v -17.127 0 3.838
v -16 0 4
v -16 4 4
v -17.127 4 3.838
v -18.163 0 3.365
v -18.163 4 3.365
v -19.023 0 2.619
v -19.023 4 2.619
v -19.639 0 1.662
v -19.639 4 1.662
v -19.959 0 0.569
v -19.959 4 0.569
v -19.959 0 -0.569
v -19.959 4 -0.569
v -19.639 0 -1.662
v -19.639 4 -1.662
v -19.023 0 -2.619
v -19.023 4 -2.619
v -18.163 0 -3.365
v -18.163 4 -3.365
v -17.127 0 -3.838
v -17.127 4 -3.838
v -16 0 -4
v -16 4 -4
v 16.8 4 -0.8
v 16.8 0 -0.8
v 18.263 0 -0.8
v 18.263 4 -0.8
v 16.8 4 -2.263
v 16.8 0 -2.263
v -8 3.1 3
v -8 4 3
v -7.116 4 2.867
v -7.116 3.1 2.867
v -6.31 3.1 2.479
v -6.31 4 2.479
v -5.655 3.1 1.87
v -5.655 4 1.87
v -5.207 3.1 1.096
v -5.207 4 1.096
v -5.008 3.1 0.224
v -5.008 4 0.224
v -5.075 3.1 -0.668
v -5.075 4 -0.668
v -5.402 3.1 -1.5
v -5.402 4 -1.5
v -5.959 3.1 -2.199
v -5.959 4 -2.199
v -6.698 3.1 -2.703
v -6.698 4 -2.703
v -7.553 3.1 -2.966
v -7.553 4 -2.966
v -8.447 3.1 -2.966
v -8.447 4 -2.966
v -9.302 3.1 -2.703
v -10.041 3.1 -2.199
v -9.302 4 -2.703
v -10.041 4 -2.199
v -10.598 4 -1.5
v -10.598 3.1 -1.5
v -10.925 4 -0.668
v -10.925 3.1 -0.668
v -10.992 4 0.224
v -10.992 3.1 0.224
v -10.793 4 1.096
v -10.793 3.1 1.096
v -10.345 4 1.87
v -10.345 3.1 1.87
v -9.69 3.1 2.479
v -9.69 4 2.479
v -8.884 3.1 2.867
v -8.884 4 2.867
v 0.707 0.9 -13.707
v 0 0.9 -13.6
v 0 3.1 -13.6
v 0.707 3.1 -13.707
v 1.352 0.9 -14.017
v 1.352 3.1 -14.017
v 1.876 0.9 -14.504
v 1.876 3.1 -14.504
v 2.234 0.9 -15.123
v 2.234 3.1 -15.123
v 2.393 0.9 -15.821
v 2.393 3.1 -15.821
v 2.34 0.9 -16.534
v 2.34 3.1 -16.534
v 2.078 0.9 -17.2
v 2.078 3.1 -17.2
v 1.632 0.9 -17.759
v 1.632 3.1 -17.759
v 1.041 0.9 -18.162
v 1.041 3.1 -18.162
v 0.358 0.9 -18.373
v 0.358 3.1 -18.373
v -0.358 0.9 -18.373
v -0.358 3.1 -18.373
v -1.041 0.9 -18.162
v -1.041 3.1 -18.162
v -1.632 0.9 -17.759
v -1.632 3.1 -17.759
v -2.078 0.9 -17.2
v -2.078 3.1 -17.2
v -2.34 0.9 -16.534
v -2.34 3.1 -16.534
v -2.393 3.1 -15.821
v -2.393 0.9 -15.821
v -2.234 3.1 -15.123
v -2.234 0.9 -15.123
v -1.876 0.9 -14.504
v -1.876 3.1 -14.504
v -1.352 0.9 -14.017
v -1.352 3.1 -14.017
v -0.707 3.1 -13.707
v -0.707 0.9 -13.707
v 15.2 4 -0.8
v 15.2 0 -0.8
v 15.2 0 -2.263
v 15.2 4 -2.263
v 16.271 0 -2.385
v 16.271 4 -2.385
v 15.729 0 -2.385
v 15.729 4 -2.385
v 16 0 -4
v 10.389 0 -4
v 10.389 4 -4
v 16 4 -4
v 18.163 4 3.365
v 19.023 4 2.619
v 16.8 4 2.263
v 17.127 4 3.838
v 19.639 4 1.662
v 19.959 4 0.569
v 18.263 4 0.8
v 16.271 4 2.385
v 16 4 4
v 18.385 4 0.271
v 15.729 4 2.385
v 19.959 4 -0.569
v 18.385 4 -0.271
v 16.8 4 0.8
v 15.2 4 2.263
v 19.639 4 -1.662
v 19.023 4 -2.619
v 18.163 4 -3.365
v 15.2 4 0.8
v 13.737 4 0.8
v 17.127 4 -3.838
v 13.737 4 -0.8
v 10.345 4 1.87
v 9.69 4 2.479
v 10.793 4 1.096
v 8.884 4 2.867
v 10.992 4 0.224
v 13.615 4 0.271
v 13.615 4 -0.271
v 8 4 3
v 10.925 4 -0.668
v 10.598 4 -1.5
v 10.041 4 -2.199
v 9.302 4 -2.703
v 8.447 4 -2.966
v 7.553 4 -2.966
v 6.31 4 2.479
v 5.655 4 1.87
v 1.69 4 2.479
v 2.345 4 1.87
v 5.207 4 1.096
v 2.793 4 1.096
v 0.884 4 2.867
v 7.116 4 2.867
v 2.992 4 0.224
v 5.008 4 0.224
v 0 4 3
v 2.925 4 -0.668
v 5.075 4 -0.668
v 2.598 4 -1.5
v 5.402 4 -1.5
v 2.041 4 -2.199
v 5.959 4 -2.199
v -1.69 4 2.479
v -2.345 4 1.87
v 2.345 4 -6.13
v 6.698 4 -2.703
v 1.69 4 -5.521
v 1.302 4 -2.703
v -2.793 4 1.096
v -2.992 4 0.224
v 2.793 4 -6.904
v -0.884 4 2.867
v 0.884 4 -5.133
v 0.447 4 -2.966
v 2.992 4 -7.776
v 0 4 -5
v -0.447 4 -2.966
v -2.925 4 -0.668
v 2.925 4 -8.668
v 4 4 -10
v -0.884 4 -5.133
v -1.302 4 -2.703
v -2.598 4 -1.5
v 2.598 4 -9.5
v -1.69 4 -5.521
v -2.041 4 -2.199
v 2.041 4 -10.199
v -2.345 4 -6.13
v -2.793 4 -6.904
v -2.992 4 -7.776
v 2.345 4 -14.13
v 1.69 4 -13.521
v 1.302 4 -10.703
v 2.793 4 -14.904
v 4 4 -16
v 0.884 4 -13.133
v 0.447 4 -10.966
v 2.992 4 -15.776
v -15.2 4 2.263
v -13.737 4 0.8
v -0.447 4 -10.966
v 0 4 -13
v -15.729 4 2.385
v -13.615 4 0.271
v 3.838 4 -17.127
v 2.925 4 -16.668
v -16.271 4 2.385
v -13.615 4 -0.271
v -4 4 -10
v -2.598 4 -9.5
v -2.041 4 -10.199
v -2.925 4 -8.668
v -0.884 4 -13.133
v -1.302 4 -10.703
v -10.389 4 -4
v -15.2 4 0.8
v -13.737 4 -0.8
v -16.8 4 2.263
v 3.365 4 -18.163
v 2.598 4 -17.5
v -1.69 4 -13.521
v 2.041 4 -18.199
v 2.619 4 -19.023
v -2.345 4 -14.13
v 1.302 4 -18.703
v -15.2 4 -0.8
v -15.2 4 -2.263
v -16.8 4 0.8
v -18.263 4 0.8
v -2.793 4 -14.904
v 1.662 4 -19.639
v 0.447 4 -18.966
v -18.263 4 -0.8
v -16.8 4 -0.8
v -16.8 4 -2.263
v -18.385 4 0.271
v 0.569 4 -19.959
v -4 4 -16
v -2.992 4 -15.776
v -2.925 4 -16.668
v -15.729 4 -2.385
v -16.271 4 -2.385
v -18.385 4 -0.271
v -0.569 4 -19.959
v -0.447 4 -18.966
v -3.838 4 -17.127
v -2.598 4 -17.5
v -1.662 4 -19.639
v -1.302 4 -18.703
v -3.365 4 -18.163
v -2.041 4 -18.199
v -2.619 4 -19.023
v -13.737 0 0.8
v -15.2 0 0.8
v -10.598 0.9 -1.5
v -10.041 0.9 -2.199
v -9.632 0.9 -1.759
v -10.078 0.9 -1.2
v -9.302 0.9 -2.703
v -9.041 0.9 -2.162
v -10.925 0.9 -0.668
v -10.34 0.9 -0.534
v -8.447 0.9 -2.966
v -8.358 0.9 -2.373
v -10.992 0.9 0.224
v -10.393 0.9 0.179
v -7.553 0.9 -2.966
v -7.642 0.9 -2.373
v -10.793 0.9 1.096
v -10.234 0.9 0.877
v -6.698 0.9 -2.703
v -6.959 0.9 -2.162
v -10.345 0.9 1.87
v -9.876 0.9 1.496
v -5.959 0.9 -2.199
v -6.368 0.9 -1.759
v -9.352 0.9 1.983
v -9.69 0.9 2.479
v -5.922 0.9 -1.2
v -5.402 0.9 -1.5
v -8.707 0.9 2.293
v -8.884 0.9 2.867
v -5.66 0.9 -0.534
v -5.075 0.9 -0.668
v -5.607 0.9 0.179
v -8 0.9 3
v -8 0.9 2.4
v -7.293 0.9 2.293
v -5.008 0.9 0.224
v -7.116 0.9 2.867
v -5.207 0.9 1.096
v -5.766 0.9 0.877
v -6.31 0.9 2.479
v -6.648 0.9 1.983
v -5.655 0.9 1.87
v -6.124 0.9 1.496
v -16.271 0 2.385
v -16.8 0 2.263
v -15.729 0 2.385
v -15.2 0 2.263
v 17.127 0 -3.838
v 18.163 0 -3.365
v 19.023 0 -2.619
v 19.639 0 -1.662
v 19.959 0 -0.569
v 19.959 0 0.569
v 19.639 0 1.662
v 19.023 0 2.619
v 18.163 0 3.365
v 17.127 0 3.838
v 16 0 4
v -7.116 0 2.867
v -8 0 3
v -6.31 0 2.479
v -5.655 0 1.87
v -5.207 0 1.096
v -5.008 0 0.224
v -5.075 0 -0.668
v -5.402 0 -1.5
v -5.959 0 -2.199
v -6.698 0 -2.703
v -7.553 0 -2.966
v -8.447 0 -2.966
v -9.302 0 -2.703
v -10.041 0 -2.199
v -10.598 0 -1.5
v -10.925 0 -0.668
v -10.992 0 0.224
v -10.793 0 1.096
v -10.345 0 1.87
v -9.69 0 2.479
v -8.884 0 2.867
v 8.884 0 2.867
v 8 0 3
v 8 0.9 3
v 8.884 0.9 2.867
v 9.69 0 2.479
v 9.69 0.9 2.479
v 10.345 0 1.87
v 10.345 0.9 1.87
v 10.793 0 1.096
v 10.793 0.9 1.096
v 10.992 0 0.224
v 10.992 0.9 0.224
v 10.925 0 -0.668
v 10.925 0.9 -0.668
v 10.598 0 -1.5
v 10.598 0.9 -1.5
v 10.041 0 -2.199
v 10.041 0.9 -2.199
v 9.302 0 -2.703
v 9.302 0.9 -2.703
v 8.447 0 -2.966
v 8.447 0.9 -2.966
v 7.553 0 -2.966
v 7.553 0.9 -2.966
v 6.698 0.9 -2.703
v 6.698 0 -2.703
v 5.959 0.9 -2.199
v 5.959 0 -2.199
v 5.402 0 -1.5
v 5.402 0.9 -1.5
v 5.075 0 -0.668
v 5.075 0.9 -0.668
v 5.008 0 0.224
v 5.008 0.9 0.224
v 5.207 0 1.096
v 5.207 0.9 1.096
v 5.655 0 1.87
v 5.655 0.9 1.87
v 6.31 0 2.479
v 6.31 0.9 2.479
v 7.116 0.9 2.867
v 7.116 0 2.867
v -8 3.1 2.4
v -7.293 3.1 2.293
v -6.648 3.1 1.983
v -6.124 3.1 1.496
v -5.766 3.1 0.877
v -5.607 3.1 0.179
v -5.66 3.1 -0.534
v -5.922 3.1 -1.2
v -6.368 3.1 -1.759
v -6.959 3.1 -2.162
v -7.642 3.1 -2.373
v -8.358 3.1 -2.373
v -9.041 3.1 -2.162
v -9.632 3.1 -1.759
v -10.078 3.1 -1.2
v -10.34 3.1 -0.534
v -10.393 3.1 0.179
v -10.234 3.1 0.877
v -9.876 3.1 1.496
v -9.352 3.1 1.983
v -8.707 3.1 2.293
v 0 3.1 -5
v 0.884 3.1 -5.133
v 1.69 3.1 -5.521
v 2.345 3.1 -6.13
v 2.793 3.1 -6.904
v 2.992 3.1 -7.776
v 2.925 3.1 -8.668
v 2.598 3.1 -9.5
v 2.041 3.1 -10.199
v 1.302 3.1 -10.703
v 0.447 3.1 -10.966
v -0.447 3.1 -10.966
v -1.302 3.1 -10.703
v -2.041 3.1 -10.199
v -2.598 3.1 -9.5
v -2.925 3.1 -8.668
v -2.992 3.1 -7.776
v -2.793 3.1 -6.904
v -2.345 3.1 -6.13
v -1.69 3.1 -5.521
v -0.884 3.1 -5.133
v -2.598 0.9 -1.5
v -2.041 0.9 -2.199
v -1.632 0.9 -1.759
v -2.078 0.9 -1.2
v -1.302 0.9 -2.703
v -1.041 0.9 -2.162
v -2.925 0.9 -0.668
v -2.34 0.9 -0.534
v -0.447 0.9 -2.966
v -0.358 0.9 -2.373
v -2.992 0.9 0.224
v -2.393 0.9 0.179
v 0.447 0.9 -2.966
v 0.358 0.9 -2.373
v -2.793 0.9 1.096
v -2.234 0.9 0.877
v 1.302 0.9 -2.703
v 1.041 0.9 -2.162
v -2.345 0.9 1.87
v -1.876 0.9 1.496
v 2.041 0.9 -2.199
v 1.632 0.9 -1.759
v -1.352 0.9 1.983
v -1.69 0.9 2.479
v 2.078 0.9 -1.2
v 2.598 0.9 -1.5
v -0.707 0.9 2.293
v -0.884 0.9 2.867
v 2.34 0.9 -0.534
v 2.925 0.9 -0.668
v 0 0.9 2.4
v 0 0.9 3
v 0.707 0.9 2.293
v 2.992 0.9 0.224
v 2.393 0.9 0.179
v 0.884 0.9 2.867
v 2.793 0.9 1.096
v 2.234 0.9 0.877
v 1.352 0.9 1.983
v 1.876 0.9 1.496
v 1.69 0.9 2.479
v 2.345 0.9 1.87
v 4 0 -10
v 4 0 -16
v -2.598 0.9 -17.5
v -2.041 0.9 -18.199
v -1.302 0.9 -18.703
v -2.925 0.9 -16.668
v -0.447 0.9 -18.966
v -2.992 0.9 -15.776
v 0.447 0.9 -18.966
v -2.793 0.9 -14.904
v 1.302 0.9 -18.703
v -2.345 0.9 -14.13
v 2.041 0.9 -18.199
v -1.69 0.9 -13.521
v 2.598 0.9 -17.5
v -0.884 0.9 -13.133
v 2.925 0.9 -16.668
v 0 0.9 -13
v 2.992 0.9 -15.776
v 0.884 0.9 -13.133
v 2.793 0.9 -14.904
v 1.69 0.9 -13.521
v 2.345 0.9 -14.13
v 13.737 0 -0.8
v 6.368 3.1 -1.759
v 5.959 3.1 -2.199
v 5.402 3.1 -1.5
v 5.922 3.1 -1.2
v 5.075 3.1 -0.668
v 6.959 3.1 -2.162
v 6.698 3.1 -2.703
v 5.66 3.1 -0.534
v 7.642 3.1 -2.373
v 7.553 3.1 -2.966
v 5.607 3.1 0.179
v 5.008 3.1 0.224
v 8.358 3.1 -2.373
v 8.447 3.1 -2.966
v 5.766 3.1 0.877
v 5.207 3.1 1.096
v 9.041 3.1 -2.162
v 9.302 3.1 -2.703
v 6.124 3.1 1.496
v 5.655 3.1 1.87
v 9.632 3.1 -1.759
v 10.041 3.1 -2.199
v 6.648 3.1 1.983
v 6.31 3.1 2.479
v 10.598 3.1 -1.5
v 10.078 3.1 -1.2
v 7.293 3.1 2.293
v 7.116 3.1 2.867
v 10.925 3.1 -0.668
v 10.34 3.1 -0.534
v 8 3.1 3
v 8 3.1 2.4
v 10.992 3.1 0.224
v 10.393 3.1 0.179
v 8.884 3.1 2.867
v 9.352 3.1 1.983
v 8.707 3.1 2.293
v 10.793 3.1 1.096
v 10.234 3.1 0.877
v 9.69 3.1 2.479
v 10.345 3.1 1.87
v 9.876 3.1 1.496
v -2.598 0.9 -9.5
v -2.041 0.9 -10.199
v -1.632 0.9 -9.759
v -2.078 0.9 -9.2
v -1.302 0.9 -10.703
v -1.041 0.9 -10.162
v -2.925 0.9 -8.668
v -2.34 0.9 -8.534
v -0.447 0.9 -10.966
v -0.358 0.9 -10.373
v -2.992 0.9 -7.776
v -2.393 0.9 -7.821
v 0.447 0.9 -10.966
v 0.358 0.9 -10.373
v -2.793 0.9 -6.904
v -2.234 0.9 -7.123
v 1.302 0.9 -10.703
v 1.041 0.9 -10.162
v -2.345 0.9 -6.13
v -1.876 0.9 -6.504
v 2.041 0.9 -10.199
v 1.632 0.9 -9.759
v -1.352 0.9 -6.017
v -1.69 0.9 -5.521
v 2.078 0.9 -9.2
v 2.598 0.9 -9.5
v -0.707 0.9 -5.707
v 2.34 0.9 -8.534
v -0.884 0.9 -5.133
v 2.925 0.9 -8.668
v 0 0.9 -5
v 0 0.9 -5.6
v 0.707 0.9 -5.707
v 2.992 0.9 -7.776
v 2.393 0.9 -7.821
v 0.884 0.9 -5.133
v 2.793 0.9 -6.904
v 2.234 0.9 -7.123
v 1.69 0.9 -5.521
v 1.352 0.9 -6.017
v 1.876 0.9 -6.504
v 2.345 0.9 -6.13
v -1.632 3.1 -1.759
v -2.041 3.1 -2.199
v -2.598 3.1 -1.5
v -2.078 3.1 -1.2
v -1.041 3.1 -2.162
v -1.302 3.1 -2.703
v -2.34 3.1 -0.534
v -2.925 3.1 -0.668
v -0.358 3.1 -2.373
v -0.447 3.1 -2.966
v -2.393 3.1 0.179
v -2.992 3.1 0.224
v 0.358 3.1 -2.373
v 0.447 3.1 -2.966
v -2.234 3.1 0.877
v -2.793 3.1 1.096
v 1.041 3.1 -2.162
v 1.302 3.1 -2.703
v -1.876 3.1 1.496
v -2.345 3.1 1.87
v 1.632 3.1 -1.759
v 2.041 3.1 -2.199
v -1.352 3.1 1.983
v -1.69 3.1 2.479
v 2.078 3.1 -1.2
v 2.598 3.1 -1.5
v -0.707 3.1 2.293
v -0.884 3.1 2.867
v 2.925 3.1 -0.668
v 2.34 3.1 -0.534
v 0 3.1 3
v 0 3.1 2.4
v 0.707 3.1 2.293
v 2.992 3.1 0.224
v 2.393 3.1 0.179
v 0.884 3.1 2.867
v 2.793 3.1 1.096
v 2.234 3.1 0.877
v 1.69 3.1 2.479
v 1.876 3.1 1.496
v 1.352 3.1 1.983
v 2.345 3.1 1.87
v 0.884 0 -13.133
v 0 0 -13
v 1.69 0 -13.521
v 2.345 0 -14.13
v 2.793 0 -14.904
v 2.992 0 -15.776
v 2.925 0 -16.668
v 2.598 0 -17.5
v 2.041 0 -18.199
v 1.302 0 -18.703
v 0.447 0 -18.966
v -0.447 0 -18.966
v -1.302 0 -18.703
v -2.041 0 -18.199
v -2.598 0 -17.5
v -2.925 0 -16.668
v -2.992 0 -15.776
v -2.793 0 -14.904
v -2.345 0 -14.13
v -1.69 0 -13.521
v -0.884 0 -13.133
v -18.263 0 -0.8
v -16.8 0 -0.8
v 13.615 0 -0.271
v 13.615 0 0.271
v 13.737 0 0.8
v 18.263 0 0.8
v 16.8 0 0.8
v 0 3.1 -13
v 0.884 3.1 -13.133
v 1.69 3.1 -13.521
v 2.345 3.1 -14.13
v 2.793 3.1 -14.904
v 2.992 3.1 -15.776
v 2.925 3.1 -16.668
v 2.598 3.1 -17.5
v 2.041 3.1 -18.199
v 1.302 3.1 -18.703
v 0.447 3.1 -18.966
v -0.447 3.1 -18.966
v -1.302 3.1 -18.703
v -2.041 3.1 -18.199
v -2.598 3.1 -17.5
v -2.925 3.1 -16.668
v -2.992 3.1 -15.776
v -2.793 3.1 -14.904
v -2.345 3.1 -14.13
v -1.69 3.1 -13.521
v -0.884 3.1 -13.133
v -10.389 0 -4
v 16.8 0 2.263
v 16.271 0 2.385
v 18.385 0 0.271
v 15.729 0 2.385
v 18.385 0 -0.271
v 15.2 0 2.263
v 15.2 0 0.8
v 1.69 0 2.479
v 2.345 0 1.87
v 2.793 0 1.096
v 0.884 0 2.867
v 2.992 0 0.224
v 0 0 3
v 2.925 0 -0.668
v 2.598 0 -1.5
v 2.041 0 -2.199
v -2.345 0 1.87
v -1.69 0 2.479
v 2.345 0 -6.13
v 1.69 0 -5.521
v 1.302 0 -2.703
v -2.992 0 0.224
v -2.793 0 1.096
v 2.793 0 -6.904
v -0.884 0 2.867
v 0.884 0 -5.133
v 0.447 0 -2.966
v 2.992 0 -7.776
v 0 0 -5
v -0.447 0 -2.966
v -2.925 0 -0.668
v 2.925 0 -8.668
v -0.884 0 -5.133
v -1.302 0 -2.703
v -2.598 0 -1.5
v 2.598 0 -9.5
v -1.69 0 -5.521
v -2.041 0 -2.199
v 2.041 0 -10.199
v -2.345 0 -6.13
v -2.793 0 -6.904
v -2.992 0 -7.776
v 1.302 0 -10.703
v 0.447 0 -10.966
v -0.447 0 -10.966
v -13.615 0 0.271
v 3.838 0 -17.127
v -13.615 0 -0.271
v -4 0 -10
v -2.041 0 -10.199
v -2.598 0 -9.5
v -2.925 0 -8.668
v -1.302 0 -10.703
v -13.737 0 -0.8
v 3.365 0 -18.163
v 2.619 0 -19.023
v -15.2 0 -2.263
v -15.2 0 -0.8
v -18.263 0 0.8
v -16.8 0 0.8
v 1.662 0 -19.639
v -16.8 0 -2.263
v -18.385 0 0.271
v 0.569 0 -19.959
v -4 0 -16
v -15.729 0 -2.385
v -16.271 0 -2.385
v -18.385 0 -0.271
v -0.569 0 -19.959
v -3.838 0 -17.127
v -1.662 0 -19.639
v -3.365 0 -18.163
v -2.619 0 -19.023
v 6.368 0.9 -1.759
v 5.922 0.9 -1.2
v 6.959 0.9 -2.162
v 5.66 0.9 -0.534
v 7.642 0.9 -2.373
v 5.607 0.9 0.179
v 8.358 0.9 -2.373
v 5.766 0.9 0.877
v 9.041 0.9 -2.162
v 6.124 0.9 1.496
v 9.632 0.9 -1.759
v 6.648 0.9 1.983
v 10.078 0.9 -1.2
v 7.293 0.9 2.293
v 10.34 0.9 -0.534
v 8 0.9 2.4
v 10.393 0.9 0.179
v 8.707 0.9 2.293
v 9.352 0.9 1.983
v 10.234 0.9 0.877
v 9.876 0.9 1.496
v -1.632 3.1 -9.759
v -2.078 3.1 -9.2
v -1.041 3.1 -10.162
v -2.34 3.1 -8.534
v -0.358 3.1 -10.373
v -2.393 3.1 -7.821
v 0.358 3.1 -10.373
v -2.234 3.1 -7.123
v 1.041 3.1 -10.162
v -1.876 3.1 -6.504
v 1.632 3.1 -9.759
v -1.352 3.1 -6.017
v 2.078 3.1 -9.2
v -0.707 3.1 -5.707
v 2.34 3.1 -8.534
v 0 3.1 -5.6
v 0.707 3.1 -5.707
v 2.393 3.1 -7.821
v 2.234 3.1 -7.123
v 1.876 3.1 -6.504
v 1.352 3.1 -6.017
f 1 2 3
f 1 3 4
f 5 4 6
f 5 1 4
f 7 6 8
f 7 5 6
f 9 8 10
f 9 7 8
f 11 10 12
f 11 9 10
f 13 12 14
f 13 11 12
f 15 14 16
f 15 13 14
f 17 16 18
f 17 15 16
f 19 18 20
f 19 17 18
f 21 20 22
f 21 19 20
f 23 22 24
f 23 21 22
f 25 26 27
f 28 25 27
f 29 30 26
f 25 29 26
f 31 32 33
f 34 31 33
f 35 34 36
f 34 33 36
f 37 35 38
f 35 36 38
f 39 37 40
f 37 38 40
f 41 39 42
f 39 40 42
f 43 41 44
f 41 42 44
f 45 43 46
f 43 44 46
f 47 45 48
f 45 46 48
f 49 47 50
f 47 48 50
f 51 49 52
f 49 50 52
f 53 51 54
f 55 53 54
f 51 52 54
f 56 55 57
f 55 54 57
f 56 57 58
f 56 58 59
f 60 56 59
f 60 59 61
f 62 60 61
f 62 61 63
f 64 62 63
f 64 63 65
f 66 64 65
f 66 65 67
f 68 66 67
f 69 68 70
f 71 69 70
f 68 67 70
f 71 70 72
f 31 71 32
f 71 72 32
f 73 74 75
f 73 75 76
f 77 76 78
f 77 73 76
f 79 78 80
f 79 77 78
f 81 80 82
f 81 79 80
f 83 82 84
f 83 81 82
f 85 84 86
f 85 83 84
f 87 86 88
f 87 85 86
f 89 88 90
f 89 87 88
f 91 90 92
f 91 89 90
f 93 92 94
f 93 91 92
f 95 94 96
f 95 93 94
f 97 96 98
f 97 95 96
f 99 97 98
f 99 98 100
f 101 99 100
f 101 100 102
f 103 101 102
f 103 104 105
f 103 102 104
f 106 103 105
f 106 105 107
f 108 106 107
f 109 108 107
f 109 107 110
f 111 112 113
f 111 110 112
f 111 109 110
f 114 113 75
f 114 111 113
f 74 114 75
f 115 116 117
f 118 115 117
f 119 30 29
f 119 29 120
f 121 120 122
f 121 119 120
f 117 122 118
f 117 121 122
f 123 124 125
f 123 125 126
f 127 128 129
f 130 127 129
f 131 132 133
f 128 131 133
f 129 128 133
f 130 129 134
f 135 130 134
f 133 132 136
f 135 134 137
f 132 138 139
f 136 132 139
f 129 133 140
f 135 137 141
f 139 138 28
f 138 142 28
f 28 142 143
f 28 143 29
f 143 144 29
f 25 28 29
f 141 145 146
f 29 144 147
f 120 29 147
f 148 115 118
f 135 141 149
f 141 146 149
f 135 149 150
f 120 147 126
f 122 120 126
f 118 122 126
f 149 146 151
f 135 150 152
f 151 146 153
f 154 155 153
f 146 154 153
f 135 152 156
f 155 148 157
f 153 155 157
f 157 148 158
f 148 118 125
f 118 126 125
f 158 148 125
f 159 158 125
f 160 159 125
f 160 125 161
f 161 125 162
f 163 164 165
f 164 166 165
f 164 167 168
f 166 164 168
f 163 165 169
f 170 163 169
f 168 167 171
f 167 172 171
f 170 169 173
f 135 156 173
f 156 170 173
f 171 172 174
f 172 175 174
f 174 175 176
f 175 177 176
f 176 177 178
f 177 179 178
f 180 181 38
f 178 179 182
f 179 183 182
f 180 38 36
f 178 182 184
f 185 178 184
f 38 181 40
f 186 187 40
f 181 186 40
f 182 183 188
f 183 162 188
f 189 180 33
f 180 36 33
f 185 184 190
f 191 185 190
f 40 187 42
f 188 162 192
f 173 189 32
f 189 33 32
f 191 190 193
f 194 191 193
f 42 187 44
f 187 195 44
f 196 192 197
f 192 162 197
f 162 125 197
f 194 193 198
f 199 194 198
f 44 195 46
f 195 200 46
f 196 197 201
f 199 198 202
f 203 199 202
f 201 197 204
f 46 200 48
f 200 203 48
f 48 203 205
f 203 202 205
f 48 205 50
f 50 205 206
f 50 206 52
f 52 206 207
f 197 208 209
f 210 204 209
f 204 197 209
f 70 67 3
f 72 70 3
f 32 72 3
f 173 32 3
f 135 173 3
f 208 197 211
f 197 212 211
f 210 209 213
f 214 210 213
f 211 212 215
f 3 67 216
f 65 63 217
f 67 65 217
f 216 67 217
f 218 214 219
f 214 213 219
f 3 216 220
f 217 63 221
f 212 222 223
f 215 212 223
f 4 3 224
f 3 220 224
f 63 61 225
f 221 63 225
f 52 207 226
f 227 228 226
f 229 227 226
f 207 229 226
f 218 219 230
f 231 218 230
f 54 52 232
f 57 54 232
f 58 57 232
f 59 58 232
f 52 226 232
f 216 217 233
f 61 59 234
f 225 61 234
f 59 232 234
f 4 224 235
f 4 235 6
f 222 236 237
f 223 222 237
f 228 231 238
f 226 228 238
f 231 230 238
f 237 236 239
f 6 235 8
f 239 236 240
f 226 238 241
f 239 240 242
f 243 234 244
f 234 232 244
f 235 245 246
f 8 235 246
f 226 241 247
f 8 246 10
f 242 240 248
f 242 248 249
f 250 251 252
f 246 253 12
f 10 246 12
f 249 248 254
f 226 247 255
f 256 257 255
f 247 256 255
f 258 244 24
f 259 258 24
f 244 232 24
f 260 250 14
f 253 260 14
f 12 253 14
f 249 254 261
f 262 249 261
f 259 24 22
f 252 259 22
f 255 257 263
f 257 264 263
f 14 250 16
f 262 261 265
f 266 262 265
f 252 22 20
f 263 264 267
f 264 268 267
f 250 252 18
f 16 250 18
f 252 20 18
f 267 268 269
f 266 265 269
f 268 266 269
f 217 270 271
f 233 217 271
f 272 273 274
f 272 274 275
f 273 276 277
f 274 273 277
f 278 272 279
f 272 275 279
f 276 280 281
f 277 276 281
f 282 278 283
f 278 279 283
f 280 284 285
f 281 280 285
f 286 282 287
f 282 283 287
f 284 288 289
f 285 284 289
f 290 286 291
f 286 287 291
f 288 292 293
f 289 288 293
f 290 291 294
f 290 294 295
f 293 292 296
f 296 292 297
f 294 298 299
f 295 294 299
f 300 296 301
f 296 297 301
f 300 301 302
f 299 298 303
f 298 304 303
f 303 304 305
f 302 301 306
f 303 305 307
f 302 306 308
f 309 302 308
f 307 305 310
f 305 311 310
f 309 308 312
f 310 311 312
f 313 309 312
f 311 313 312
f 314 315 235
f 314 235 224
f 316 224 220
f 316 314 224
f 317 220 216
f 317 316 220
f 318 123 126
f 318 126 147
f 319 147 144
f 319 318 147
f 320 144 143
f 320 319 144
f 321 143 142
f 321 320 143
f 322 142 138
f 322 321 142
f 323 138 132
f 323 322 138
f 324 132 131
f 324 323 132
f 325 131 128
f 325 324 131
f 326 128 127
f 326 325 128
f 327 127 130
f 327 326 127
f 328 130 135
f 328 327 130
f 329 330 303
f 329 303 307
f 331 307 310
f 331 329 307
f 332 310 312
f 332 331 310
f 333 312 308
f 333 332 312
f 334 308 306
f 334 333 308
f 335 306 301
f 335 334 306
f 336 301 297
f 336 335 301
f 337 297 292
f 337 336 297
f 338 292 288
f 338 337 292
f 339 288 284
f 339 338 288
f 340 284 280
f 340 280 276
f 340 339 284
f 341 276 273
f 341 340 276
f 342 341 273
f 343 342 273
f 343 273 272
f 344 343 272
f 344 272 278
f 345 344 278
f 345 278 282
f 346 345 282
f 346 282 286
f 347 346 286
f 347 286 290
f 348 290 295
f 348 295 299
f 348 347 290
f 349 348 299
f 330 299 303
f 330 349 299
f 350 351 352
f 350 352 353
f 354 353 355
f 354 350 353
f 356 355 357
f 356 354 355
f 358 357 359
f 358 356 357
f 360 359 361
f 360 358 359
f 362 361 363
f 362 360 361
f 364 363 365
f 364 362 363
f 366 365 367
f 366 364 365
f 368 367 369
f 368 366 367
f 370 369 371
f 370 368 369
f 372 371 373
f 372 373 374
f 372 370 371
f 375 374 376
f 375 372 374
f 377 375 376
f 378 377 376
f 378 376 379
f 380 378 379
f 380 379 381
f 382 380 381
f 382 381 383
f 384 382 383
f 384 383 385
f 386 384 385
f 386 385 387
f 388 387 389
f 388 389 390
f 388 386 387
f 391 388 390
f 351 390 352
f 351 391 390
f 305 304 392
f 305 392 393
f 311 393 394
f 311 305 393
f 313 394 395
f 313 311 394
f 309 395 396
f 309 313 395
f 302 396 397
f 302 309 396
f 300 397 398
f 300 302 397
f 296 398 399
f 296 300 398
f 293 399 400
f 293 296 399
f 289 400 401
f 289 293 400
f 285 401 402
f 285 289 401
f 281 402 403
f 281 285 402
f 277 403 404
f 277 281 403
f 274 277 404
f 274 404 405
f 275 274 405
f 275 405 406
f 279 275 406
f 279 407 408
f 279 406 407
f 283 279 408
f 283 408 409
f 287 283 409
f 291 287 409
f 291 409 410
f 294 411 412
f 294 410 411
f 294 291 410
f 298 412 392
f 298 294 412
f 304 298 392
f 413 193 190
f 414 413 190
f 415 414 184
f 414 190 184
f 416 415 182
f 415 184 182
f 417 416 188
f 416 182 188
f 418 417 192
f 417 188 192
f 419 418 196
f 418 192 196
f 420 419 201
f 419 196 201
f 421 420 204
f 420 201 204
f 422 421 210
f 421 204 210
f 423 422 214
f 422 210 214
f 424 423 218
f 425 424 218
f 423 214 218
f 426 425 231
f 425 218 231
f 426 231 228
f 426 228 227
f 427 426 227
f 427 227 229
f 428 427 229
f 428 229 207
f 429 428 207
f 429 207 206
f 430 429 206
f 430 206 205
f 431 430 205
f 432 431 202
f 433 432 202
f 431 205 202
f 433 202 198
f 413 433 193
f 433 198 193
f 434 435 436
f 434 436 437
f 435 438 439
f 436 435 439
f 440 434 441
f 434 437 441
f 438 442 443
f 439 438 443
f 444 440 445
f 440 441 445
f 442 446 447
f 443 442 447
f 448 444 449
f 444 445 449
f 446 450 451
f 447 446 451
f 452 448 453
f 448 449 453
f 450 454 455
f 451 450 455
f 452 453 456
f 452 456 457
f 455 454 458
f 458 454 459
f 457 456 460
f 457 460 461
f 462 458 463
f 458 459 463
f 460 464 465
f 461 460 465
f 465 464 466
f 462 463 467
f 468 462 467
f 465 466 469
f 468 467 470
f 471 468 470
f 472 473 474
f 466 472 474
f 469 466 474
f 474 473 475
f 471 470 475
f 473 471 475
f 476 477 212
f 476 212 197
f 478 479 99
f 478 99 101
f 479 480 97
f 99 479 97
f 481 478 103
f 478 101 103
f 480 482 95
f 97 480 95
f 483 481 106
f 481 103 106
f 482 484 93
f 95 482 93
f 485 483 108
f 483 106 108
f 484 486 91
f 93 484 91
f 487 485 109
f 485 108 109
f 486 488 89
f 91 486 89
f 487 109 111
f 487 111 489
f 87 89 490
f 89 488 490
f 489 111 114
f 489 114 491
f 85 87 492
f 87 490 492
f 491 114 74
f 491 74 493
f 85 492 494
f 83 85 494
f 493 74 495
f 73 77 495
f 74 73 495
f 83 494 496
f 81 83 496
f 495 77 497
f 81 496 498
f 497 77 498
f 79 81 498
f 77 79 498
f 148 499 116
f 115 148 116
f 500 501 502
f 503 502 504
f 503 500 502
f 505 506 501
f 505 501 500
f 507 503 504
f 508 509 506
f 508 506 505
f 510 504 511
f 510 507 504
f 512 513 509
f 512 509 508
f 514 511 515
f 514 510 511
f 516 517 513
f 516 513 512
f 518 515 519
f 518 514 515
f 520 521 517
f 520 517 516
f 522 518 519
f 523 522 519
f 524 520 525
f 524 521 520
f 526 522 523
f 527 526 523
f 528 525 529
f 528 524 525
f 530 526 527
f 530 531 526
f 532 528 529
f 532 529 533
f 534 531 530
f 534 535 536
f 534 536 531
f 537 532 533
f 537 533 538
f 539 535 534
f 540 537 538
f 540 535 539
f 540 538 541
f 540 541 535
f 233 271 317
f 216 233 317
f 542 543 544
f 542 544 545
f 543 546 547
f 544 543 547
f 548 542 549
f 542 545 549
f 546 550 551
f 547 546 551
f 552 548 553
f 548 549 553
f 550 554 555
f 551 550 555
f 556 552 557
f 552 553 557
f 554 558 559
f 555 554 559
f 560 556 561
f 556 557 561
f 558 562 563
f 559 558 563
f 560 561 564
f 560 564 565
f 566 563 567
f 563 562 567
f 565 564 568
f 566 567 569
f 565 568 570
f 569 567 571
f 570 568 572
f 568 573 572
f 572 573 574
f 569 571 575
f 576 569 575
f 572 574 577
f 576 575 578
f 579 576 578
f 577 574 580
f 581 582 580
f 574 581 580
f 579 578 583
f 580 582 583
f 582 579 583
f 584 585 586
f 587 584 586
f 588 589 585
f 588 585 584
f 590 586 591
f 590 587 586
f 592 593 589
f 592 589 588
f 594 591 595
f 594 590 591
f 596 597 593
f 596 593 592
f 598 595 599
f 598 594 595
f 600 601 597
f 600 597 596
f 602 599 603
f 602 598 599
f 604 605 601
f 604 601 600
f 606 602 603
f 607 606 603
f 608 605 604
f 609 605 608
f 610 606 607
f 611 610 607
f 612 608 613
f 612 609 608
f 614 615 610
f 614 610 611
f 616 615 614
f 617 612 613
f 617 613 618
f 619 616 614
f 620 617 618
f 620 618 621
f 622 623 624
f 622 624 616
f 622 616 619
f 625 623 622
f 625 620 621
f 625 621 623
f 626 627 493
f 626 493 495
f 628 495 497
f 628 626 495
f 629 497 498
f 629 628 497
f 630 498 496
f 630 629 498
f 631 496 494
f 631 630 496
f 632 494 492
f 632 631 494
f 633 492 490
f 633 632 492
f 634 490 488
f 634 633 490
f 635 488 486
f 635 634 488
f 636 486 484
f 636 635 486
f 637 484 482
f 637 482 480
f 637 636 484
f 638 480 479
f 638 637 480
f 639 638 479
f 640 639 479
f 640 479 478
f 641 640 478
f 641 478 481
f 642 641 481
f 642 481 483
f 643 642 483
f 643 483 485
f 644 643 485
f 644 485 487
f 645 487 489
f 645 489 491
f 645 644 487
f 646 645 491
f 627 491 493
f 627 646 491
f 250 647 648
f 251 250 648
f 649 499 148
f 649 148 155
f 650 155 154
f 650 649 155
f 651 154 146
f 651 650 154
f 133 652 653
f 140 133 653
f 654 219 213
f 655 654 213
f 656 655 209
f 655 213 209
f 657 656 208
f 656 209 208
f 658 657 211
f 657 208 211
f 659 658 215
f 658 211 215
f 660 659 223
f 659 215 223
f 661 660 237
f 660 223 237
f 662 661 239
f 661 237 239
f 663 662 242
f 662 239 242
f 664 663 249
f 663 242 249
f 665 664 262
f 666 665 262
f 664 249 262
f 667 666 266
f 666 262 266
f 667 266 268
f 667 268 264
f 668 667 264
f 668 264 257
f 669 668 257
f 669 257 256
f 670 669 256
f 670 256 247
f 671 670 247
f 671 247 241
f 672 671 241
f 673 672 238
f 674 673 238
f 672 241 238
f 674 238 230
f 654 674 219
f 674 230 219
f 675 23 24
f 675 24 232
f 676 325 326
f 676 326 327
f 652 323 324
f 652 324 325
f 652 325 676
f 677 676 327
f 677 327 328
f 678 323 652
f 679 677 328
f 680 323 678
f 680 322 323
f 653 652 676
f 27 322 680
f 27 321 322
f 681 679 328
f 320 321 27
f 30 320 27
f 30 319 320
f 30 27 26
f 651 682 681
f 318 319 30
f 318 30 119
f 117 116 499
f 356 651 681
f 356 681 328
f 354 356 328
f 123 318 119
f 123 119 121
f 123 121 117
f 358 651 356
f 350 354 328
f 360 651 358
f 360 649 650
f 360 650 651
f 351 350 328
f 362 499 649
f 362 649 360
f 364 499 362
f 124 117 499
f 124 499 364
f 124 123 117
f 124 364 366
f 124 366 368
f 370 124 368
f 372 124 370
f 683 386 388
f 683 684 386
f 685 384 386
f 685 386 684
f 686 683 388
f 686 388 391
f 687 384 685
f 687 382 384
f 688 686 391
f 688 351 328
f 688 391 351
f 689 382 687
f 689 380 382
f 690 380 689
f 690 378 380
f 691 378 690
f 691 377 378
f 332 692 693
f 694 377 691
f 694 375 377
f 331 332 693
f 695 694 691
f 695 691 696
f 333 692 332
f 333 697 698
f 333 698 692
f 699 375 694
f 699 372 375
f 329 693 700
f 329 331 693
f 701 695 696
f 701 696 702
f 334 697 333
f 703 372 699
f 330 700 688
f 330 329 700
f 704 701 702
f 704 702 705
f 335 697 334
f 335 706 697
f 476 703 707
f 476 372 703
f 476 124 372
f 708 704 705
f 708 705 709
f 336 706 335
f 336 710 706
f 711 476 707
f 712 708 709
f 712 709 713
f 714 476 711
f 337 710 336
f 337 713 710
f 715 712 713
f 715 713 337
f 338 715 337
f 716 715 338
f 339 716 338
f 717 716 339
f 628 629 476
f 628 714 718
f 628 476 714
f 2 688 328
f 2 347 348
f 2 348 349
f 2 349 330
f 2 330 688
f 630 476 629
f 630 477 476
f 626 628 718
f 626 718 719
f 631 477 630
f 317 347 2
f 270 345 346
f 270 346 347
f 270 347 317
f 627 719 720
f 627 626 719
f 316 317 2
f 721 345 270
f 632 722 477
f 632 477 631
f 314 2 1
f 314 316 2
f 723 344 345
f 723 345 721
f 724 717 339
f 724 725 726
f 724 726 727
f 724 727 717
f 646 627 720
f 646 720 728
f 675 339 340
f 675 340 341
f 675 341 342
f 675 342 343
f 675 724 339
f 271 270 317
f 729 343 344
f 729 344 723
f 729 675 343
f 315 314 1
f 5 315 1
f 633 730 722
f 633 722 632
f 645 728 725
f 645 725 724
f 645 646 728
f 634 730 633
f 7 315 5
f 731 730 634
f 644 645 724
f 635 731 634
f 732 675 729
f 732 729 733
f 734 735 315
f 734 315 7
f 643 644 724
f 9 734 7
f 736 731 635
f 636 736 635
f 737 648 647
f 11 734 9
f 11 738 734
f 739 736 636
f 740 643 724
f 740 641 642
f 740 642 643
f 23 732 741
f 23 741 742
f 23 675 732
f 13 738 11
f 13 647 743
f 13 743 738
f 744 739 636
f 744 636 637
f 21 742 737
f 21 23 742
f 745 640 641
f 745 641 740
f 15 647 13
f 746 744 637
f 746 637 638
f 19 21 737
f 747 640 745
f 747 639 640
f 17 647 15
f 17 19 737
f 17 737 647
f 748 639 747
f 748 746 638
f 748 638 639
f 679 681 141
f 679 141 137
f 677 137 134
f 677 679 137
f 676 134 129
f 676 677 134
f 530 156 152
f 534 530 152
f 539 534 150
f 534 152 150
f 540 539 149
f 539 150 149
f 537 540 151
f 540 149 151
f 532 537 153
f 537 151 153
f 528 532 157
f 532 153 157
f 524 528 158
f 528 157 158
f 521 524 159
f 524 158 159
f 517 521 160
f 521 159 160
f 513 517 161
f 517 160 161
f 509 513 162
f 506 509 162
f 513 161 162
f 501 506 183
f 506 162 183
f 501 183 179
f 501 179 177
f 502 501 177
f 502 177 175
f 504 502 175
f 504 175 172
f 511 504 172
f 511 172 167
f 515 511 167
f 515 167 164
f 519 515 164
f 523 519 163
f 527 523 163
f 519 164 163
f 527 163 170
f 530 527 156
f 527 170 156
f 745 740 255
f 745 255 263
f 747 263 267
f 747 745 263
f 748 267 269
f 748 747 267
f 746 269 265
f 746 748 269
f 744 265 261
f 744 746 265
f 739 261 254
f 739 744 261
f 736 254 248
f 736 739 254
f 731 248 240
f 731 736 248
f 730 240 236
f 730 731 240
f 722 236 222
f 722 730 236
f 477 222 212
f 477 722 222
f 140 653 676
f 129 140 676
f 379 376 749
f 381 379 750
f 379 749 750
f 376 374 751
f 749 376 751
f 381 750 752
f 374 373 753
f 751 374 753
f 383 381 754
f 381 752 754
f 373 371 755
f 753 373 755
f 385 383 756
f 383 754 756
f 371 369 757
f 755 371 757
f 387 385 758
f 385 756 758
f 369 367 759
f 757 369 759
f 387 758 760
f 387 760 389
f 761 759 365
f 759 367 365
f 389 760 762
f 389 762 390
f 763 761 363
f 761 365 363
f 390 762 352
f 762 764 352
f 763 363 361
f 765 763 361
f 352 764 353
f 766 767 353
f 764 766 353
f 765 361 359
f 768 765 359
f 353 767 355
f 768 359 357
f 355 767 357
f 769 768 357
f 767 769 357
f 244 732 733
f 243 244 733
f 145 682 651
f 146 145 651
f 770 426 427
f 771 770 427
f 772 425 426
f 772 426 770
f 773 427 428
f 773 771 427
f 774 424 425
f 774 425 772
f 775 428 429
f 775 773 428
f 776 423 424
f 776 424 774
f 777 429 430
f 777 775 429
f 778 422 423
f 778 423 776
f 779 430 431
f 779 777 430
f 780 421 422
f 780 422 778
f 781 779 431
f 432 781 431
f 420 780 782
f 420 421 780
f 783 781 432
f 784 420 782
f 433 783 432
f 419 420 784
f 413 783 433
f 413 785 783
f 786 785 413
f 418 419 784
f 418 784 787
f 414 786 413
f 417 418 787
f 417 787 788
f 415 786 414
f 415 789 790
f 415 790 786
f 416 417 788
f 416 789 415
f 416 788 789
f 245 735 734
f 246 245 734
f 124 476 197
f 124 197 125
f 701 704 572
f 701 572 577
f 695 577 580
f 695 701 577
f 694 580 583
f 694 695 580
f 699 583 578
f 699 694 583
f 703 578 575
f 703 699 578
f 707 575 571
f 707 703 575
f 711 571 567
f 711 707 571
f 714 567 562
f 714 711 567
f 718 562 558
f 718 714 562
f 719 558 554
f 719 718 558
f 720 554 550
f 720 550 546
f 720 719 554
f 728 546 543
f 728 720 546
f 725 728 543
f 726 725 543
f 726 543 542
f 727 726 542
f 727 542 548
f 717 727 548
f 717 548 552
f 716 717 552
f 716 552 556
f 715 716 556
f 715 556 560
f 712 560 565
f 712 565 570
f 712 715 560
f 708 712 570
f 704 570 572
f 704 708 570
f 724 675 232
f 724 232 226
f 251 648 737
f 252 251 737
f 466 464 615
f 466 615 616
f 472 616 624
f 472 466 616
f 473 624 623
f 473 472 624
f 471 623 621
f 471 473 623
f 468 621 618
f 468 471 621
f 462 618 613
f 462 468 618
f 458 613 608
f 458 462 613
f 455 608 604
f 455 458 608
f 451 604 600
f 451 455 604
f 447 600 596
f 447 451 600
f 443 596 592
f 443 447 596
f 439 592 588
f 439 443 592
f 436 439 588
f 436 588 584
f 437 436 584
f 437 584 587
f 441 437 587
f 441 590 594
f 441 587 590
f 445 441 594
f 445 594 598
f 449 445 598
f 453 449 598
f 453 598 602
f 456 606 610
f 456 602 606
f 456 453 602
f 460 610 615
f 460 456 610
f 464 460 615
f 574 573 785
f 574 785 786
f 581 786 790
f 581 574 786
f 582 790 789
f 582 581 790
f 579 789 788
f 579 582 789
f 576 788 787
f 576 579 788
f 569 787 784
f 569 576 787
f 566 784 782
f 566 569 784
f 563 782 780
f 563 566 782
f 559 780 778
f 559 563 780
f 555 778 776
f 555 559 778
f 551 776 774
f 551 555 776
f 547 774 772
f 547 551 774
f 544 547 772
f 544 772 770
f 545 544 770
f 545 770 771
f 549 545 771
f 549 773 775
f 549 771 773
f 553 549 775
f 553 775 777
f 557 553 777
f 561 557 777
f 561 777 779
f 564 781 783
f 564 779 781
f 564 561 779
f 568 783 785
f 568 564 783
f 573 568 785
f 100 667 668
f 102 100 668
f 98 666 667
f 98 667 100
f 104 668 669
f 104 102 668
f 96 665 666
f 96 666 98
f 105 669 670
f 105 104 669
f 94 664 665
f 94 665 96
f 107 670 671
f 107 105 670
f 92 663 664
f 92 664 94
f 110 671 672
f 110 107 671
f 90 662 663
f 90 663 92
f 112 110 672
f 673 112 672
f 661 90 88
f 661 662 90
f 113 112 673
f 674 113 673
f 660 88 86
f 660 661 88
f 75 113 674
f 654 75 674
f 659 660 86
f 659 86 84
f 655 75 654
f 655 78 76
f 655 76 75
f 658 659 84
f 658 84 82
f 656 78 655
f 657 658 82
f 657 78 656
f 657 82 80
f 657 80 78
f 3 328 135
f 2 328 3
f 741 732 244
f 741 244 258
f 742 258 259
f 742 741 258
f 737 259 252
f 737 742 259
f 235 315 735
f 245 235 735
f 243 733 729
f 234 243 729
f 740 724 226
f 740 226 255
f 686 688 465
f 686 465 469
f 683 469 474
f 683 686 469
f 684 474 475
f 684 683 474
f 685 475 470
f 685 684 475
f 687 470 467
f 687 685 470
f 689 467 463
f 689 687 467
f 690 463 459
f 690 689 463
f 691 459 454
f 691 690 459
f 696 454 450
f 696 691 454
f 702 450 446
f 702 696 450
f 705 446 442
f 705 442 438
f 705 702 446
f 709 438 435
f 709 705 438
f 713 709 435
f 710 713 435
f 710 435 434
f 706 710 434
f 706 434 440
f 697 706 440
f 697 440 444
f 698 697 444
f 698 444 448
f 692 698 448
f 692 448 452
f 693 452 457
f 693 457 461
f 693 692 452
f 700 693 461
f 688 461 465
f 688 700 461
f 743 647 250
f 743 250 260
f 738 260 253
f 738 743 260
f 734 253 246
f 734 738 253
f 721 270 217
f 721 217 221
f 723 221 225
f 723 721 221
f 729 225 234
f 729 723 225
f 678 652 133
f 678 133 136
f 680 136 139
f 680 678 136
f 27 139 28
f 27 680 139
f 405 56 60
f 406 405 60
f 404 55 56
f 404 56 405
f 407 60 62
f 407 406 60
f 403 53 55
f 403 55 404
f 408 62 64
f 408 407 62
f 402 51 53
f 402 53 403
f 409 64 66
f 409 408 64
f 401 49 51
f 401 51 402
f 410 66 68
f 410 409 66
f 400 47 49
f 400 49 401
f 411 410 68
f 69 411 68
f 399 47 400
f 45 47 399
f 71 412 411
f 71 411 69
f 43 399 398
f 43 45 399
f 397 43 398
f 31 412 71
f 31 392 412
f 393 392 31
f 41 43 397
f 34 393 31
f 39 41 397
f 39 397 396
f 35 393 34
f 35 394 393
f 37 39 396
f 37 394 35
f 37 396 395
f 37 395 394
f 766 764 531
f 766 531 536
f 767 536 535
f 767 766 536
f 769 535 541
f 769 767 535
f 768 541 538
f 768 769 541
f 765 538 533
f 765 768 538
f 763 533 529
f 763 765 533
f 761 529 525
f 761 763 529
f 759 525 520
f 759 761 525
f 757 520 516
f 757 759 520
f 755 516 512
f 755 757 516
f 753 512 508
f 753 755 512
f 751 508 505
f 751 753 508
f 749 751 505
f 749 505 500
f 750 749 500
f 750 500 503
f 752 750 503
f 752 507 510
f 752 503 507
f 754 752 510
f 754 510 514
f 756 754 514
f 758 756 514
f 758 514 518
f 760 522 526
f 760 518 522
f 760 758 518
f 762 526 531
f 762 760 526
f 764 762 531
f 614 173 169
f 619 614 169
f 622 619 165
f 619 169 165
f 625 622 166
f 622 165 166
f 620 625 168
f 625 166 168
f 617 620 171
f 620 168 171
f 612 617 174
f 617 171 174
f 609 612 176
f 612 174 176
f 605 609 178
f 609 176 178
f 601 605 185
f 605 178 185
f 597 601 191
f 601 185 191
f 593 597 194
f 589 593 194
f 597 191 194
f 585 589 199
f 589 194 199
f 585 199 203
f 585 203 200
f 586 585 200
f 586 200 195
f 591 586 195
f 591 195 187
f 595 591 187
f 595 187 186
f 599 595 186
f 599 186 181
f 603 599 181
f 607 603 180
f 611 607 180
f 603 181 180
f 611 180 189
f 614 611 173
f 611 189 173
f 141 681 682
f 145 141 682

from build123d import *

# Parameters (mm, degrees)
SKETCH_1_R          = 2.4
EXTRUDE_1_DEPTH     = 4
SKETCH_2_R          = 3
CUT_EXTRUDE_1_DEPTH = 0.9
EXTRUDE_START       = -4
EXTRUDE_2_DEPTH     = 4


with BuildPart() as part:
    # 草图1 → 凸台-拉伸1 (new body)
    with BuildSketch(Plane(origin=(0, 0, 0), x_dir=(1, 0, 0), z_dir=(0, 1, 0))):
        with BuildLine():
            Line((-16, 4), (-10.388851415, 4))
            Line((-10.388851415, 4), (-4, 10))
            Line((-4, 10), (-4, 16))
            ThreePointArc((-4, 16), (0, 20), (4, 16))
            Line((4, 16), (4, 10))
            Line((4, 10), (10.388851415, 4))
            Line((10.388851415, 4), (16, 4))
            ThreePointArc((16, 4), (20, 0), (16, -4))
            Line((16, -4), (-16, -4))
            ThreePointArc((-16, -4), (-20, 0), (-16, 4))
        make_face()
        with Locations(Location((16, 0, 0), (0, 0, 270))):
            Circle(SKETCH_1_R, mode=Mode.SUBTRACT)
        with Locations(Location((8, 0, 0), (0, 0, 270))):
            Circle(SKETCH_1_R, mode=Mode.SUBTRACT)
        with Locations(Location((0, 0, 0), (0, 0, 270))):
            Circle(SKETCH_1_R, mode=Mode.SUBTRACT)
        with Locations(Location((-8, 0, 0), (0, 0, 270))):
            Circle(SKETCH_1_R, mode=Mode.SUBTRACT)
        with Locations(Location((-16, 0, 0), (0, 0, 270))):
            Circle(SKETCH_1_R, mode=Mode.SUBTRACT)
        with Locations(Location((0, 8, 0), (0, 0, 270))):
            Circle(SKETCH_1_R, mode=Mode.SUBTRACT)
        with Locations(Location((0, 16, 0), (0, 0, 270))):
            Circle(SKETCH_1_R, mode=Mode.SUBTRACT)
    extrude(amount=EXTRUDE_1_DEPTH)

    # 草图2 → 切除-拉伸1 (cut)
    with BuildSketch(Plane(origin=(0, 4, 0), x_dir=(1, 0, 0), z_dir=(0, 1, 0))):
        with Locations(Location((-8, 0, 0), (0, 0, 270))):
            Circle(SKETCH_2_R)
        with Locations(Location((0, 0, 0), (0, 0, 270))):
            Circle(SKETCH_2_R)
        with Locations(Location((8, 0, 0), (0, 0, 270))):
            Circle(SKETCH_2_R)
        with Locations(Location((0, 8, 0), (0, 0, 270))):
            Circle(SKETCH_2_R)
        with Locations(Location((0, 16, 0), (0, 0, 270))):
            Circle(SKETCH_2_R)
    cut_extrude_1 = extrude(amount=-CUT_EXTRUDE_1_DEPTH, mode=Mode.SUBTRACT)

    # 镜向1: 切除-拉伸1 across plane
    add(cut_extrude_1.mirror(Plane.ZX.offset(2)), mode=Mode.SUBTRACT)

    # 草图4 → 凸台-拉伸2 (add)
    with BuildSketch(Plane(origin=(0, 4, 0), x_dir=(1, 0, 0), z_dir=(0, 1, 0)).offset(EXTRUDE_START)):
        with BuildLine():
            Line((-16.8, 0.8), (-16.8, 2.2627417))
            ThreePointArc((-16.8, 2.2627417), (-17.697056275, 1.697056275), (-18.2627417, 0.8))
            Line((-18.2627417, 0.8), (-16.8, 0.8))
        make_face()
        with BuildLine():
            ThreePointArc((-13.7372583, 0.8), (-14.302943725, 1.697056275), (-15.2, 2.2627417))
            Line((-15.2, 2.2627417), (-15.2, 0.8))
            Line((-15.2, 0.8), (-13.7372583, 0.8))
        make_face()
        with BuildLine():
            Line((-13.7372583, -0.8), (-15.2, -0.8))
            Line((-15.2, -0.8), (-15.2, -2.2627417))
            ThreePointArc((-15.2, -2.2627417), (-14.302943725, -1.697056275), (-13.7372583, -0.8))
        make_face()
        with BuildLine():
            Line((-16.8, -2.2627417), (-16.8, -0.8))
            Line((-16.8, -0.8), (-18.2627417, -0.8))
            ThreePointArc((-18.2627417, -0.8), (-17.697056275, -1.697056275), (-16.8, -2.2627417))
        make_face()
        with BuildLine():
            Line((13.7372583, 0.8), (15.2, 0.8))
            Line((15.2, 0.8), (15.2, 2.2627417))
            ThreePointArc((15.2, 2.2627417), (14.302943725, 1.697056275), (13.7372583, 0.8))
        make_face()
        with BuildLine():
            Line((16.8, 0.8), (18.2627417, 0.8))
            ThreePointArc((18.2627417, 0.8), (17.697056275, 1.697056275), (16.8, 2.2627417))
            Line((16.8, 2.2627417), (16.8, 0.8))
        make_face()
        with BuildLine():
            Line((18.2627417, -0.8), (16.8, -0.8))
            Line((16.8, -0.8), (16.8, -2.2627417))
            ThreePointArc((16.8, -2.2627417), (17.697056275, -1.697056275), (18.2627417, -0.8))
        make_face()
        with BuildLine():
            Line((15.2, -2.2627417), (15.2, -0.8))
            Line((15.2, -0.8), (13.7372583, -0.8))
            ThreePointArc((13.7372583, -0.8), (14.302943725, -1.697056275), (15.2, -2.2627417))
        make_face()
    extrude(amount=EXTRUDE_2_DEPTH)


solid = part.part
